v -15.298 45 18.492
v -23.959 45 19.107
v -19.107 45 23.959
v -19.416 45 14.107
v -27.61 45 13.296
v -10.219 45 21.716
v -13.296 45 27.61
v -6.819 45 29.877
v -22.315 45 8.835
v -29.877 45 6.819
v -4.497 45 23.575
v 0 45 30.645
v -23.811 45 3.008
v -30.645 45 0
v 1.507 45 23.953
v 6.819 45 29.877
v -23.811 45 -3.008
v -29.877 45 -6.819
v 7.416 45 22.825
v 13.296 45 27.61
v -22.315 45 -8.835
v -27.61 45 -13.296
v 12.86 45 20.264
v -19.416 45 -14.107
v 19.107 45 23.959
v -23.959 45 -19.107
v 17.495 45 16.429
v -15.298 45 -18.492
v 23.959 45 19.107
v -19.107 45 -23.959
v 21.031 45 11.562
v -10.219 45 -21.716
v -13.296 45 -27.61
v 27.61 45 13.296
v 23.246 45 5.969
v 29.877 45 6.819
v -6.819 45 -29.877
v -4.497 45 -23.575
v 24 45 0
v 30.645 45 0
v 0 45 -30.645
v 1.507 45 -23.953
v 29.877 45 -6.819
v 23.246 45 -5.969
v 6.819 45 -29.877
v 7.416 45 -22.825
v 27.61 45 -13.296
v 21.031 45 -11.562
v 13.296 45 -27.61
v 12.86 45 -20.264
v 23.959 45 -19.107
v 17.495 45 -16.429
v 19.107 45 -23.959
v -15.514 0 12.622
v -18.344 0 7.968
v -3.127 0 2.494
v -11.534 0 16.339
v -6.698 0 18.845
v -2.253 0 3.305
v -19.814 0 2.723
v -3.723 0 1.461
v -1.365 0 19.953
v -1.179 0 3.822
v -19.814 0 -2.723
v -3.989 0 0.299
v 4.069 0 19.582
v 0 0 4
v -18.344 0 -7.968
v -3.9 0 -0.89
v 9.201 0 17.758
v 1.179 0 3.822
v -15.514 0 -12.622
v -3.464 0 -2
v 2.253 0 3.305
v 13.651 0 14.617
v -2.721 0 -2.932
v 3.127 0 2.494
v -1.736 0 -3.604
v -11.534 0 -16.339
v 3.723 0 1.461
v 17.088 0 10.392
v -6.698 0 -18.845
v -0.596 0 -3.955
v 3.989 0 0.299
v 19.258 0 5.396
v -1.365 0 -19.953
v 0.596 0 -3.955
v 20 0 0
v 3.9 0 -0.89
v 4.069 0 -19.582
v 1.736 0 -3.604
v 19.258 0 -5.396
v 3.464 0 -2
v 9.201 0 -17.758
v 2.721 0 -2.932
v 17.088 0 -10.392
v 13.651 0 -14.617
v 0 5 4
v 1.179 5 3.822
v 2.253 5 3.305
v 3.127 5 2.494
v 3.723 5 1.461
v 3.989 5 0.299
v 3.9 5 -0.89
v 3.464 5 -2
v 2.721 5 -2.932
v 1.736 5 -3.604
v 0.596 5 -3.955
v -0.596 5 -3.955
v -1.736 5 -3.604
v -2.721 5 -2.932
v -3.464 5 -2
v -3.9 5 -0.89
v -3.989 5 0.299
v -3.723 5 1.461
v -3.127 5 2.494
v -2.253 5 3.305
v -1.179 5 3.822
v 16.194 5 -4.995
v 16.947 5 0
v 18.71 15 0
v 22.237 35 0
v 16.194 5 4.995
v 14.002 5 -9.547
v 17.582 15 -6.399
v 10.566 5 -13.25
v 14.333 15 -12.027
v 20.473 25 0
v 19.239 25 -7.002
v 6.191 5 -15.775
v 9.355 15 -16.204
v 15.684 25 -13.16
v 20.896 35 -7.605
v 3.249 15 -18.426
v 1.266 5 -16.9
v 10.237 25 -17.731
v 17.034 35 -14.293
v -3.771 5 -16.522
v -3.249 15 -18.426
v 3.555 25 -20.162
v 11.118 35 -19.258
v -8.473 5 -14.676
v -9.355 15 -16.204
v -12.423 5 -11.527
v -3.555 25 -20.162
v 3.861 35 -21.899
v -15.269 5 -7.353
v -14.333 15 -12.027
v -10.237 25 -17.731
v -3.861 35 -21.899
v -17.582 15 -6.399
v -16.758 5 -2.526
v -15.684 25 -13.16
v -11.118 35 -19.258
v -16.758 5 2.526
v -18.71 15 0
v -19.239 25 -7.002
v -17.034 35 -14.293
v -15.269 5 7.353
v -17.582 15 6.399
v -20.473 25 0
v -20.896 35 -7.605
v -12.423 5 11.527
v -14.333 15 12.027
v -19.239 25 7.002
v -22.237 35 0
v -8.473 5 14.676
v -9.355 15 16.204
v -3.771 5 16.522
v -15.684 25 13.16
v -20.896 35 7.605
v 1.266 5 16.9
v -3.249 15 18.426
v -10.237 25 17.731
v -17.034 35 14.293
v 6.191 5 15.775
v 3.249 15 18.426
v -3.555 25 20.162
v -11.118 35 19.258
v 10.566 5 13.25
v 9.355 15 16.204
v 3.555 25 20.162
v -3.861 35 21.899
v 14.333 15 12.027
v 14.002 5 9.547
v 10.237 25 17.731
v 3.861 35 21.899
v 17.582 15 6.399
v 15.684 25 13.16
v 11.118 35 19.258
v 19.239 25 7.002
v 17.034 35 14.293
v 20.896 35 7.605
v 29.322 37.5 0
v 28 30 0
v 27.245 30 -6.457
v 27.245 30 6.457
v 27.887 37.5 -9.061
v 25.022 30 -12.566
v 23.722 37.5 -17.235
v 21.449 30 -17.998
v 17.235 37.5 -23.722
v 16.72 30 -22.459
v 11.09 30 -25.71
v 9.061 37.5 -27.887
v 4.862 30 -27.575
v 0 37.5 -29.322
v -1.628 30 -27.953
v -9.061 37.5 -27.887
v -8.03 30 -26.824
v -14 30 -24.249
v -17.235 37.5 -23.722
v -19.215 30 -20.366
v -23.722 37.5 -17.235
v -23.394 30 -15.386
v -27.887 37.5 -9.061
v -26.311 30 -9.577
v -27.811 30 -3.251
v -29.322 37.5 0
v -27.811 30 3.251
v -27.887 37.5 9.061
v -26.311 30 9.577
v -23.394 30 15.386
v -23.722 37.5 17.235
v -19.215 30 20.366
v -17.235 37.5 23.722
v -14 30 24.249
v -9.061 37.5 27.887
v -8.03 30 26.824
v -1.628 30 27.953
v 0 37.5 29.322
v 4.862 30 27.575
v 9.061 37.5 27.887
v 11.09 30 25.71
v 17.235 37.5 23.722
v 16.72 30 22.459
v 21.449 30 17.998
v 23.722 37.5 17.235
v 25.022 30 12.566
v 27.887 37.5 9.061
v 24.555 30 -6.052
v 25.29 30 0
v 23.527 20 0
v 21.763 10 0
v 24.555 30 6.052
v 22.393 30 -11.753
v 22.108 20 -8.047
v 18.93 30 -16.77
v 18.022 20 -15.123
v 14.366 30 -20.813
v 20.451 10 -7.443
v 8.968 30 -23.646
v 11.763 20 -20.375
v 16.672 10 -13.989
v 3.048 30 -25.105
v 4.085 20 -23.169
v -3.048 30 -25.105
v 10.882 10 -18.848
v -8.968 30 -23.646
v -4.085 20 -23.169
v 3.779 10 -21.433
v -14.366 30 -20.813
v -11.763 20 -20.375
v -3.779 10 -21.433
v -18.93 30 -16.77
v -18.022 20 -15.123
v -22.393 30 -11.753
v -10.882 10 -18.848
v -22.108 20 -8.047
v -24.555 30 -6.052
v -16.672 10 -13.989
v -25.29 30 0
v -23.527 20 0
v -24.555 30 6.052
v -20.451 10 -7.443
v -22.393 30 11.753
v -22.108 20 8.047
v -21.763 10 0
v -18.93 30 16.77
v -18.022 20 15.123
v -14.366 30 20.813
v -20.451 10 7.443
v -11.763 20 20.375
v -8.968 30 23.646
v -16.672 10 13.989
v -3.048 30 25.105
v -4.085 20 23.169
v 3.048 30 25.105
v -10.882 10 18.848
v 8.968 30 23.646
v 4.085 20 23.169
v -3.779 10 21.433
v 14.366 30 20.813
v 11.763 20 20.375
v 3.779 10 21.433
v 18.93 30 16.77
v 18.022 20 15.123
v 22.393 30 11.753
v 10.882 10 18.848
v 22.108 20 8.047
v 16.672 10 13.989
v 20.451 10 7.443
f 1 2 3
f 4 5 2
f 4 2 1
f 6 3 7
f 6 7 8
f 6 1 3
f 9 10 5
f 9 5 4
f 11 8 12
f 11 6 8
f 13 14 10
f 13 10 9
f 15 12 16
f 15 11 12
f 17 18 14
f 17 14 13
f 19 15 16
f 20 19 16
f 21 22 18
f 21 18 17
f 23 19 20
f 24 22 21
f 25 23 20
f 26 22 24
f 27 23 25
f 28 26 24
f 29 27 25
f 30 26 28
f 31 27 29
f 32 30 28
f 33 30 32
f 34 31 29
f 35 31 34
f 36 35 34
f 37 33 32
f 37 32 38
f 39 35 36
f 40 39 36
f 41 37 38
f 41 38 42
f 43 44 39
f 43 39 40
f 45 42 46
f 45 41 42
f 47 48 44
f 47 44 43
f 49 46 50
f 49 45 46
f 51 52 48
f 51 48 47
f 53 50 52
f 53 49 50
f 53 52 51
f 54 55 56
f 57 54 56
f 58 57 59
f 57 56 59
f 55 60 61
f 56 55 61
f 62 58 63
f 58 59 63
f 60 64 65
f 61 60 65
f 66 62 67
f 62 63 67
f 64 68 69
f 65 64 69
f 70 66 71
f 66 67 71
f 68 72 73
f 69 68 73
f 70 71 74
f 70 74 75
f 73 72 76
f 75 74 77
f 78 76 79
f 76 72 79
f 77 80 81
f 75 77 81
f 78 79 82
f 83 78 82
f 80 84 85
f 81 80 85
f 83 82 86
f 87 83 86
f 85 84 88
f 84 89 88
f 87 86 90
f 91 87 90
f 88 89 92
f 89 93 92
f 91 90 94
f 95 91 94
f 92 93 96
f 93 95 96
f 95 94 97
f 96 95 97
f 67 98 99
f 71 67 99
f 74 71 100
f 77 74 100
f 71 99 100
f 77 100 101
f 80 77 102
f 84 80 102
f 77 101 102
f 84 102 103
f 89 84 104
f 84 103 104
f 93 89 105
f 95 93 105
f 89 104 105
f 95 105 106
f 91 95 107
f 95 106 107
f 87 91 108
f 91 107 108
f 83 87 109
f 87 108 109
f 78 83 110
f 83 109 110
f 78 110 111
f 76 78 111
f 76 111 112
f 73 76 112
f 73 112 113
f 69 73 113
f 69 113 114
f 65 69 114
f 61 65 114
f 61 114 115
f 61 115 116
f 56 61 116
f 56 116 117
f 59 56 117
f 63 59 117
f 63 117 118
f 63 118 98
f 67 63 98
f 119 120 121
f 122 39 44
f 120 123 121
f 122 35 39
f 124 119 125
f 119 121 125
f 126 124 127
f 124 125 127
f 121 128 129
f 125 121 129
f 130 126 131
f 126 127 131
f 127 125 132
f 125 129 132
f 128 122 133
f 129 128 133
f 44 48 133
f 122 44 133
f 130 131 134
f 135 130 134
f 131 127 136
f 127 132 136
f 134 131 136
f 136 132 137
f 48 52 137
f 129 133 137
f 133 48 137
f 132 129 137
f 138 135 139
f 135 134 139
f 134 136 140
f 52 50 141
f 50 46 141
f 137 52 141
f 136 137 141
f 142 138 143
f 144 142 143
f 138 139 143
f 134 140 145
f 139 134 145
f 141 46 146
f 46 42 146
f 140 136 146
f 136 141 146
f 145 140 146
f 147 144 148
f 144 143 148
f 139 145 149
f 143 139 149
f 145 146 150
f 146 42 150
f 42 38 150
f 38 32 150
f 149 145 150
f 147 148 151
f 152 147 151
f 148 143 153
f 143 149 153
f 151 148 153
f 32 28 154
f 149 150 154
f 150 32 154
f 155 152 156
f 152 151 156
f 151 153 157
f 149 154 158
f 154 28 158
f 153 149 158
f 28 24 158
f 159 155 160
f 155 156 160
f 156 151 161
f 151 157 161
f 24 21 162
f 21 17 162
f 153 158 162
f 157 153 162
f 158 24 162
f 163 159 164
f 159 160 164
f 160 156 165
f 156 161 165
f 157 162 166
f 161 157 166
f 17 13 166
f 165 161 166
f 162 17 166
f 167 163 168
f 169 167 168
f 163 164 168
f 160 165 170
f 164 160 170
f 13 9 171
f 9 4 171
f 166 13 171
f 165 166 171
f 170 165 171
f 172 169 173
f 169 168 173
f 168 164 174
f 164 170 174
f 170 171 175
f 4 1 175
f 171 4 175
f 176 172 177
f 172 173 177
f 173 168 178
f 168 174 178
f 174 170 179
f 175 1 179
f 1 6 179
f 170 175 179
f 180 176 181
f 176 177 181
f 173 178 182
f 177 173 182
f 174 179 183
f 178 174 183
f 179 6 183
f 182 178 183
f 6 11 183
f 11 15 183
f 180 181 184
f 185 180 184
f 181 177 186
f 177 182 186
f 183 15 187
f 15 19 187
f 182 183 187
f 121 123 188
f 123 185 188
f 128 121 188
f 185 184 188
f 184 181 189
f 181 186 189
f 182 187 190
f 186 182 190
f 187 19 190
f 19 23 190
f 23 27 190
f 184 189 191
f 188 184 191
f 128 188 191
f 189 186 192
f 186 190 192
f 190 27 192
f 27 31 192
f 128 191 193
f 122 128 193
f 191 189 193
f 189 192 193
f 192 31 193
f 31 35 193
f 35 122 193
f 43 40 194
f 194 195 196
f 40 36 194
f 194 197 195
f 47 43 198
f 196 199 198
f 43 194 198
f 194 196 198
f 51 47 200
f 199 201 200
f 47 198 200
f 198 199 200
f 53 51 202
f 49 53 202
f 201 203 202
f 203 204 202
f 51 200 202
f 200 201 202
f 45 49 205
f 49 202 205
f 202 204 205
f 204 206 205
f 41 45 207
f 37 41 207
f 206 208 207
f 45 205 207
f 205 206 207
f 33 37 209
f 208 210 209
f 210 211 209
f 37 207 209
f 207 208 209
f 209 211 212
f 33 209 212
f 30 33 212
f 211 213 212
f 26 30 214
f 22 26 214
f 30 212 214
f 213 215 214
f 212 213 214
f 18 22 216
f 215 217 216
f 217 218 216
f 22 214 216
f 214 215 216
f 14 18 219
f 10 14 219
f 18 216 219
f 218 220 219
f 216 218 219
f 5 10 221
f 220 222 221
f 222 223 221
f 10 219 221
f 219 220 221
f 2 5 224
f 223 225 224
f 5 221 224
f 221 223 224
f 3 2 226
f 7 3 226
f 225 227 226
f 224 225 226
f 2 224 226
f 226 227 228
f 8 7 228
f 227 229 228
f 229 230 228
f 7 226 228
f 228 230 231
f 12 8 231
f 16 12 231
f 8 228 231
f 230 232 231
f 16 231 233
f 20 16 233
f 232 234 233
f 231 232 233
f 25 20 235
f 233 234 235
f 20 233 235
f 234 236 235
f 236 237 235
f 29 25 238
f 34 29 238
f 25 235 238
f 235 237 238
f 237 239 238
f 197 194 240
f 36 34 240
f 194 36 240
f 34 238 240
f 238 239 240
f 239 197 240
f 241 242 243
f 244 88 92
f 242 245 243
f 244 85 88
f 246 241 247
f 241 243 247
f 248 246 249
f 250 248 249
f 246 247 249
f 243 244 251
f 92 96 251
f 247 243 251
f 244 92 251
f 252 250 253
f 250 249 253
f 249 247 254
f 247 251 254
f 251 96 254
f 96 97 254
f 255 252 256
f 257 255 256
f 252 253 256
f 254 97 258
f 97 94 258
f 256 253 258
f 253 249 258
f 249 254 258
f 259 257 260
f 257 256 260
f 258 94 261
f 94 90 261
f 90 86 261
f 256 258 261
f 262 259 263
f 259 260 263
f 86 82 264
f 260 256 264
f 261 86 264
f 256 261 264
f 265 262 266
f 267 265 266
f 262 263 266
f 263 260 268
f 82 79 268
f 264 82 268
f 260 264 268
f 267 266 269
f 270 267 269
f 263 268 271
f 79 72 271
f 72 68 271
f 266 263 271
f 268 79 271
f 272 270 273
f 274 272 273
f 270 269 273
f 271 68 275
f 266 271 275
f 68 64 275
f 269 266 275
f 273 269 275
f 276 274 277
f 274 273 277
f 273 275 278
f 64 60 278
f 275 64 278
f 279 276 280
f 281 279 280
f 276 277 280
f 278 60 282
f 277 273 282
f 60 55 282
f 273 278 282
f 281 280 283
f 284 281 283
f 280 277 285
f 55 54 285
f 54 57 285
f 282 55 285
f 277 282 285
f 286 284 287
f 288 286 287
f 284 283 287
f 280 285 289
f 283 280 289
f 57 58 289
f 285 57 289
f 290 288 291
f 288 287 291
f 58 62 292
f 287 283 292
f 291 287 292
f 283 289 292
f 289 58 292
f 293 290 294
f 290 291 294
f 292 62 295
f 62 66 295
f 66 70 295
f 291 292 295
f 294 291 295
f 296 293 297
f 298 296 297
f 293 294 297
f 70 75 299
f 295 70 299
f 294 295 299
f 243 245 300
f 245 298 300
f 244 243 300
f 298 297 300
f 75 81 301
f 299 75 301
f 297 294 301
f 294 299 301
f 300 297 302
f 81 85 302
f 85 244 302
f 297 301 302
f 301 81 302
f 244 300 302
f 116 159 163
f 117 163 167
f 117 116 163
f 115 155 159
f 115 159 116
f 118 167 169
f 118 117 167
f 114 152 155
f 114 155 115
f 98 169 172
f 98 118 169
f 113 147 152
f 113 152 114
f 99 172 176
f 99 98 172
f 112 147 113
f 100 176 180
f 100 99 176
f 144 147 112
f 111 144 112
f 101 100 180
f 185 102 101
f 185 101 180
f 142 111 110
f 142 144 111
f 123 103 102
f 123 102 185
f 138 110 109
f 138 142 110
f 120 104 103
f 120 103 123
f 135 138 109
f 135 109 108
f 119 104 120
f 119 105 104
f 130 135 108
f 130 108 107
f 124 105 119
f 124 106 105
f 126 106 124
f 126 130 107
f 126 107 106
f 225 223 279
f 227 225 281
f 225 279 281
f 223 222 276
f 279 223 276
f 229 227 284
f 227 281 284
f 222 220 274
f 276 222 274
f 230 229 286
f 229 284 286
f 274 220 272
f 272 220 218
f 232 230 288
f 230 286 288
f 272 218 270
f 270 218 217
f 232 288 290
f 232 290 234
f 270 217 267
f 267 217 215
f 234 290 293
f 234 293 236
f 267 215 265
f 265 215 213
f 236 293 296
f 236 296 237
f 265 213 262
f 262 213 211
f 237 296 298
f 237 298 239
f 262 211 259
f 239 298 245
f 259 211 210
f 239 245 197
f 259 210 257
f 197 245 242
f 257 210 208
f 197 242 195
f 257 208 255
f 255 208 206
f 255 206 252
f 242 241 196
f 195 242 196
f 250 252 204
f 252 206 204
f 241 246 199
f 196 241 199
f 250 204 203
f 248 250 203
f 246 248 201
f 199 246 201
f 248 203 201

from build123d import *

# Parameters (mm, degrees)
SKETCH1_R           = 20
BOSS_EXTRUDE1_DEPTH = 30
BOSS_EXTRUDE1_DRAFT = -10
SKETCH5_R           = 28
BOSS_EXTRUDE3_DEPTH = 15
BOSS_EXTRUDE3_DRAFT = -10
SKETCH6_R           = 24
CUT_EXTRUDE3_DEPTH  = 40
CUT_EXTRUDE3_DRAFT  = -10
CUT_EXTRUDE4_REACH  = 60.976
SKETCH7_R           = 4


with BuildPart() as part:
    # Sketch1 → Boss-Extrude1 (with draft: the straight prism first)
    with BuildSketch(Plane(origin=(0, 0, 0), x_dir=(1, 0, 0), z_dir=(0, 1, 0))):
        Circle(SKETCH1_R)
    extrude(amount=BOSS_EXTRUDE1_DEPTH)
    # Boss-Extrude1: the draft: its side faces are tilted about the plane it starts from
    boss_extrude1_sides = [part.faces().sort_by_distance(p)[0] for p in [
        (-20, 15, 0),
    ]]
    draft(boss_extrude1_sides, Plane(origin=(0, 0, 0), x_dir=(1, 0, 0), z_dir=(0, 1, 0)), BOSS_EXTRUDE1_DRAFT)


with BuildPart() as boss_extrude3_tool:
    # Sketch5 → Boss-Extrude3 (with draft: the straight prism first)
    with BuildSketch(Plane(origin=(0, 30, 0), x_dir=(1, 0, 0), z_dir=(0, 1, 0))):
        Circle(SKETCH5_R)
    extrude(amount=BOSS_EXTRUDE3_DEPTH)
    # Boss-Extrude3: the draft: its side faces are tilted about the plane it starts from
    boss_extrude3_sides = [boss_extrude3_tool.faces().sort_by_distance(p)[0] for p in [
        (-28, 37.5, 0),
    ]]
    draft(boss_extrude3_sides, Plane(origin=(0, 30, 0), x_dir=(1, 0, 0), z_dir=(0, 1, 0)), BOSS_EXTRUDE3_DRAFT)


with BuildPart() as part_1:
    add(part.part)

    # Boss-Extrude3: add boss_extrude3_tool
    add(boss_extrude3_tool.part)


with BuildPart() as cut_extrude3_tool:
    # Sketch6 → Cut-Extrude3 (with draft: the straight prism first)
    with BuildSketch(Plane(origin=(0, 45, 0), x_dir=(1, 0, 0), z_dir=(0, 1, 0))):
        Circle(SKETCH6_R)
    extrude(amount=-CUT_EXTRUDE3_DEPTH)
    # Cut-Extrude3: the draft: its side faces are tilted about the plane it starts from
    cut_extrude3_sides = [cut_extrude3_tool.faces().sort_by_distance(p)[0] for p in [
        (-24, 25, 0),
    ]]
    draft(cut_extrude3_sides, Plane(origin=(0, 45, 0), x_dir=(1, 0, 0), z_dir=(0, 1, 0)), CUT_EXTRUDE3_DRAFT)


with BuildPart() as part_2:
    add(part_1.part)

    # Cut-Extrude3: cut by cut_extrude3_tool
    add(cut_extrude3_tool.part, mode=Mode.SUBTRACT)

    # Sketch7 → Cut-Extrude4 (cut, up to next)
    with BuildSketch(Plane(origin=(0, 5, 0), x_dir=(1, 0, 0), z_dir=(0, 1, 0)), mode=Mode.PRIVATE) as cut_extrude4_sk1:
        with Locations(Location((0, 0, 0), (0, 0, 270))):
            Circle(SKETCH7_R)
    cut_extrude4_tool1 = extrude(cut_extrude4_sk1.sketch, amount=-CUT_EXTRUDE4_REACH, mode=Mode.PRIVATE) & part_2.part
    add(cut_extrude4_tool1.solids().sort_by_distance((0, 5, 0))[0], mode=Mode.SUBTRACT)


solid = part_2.part
